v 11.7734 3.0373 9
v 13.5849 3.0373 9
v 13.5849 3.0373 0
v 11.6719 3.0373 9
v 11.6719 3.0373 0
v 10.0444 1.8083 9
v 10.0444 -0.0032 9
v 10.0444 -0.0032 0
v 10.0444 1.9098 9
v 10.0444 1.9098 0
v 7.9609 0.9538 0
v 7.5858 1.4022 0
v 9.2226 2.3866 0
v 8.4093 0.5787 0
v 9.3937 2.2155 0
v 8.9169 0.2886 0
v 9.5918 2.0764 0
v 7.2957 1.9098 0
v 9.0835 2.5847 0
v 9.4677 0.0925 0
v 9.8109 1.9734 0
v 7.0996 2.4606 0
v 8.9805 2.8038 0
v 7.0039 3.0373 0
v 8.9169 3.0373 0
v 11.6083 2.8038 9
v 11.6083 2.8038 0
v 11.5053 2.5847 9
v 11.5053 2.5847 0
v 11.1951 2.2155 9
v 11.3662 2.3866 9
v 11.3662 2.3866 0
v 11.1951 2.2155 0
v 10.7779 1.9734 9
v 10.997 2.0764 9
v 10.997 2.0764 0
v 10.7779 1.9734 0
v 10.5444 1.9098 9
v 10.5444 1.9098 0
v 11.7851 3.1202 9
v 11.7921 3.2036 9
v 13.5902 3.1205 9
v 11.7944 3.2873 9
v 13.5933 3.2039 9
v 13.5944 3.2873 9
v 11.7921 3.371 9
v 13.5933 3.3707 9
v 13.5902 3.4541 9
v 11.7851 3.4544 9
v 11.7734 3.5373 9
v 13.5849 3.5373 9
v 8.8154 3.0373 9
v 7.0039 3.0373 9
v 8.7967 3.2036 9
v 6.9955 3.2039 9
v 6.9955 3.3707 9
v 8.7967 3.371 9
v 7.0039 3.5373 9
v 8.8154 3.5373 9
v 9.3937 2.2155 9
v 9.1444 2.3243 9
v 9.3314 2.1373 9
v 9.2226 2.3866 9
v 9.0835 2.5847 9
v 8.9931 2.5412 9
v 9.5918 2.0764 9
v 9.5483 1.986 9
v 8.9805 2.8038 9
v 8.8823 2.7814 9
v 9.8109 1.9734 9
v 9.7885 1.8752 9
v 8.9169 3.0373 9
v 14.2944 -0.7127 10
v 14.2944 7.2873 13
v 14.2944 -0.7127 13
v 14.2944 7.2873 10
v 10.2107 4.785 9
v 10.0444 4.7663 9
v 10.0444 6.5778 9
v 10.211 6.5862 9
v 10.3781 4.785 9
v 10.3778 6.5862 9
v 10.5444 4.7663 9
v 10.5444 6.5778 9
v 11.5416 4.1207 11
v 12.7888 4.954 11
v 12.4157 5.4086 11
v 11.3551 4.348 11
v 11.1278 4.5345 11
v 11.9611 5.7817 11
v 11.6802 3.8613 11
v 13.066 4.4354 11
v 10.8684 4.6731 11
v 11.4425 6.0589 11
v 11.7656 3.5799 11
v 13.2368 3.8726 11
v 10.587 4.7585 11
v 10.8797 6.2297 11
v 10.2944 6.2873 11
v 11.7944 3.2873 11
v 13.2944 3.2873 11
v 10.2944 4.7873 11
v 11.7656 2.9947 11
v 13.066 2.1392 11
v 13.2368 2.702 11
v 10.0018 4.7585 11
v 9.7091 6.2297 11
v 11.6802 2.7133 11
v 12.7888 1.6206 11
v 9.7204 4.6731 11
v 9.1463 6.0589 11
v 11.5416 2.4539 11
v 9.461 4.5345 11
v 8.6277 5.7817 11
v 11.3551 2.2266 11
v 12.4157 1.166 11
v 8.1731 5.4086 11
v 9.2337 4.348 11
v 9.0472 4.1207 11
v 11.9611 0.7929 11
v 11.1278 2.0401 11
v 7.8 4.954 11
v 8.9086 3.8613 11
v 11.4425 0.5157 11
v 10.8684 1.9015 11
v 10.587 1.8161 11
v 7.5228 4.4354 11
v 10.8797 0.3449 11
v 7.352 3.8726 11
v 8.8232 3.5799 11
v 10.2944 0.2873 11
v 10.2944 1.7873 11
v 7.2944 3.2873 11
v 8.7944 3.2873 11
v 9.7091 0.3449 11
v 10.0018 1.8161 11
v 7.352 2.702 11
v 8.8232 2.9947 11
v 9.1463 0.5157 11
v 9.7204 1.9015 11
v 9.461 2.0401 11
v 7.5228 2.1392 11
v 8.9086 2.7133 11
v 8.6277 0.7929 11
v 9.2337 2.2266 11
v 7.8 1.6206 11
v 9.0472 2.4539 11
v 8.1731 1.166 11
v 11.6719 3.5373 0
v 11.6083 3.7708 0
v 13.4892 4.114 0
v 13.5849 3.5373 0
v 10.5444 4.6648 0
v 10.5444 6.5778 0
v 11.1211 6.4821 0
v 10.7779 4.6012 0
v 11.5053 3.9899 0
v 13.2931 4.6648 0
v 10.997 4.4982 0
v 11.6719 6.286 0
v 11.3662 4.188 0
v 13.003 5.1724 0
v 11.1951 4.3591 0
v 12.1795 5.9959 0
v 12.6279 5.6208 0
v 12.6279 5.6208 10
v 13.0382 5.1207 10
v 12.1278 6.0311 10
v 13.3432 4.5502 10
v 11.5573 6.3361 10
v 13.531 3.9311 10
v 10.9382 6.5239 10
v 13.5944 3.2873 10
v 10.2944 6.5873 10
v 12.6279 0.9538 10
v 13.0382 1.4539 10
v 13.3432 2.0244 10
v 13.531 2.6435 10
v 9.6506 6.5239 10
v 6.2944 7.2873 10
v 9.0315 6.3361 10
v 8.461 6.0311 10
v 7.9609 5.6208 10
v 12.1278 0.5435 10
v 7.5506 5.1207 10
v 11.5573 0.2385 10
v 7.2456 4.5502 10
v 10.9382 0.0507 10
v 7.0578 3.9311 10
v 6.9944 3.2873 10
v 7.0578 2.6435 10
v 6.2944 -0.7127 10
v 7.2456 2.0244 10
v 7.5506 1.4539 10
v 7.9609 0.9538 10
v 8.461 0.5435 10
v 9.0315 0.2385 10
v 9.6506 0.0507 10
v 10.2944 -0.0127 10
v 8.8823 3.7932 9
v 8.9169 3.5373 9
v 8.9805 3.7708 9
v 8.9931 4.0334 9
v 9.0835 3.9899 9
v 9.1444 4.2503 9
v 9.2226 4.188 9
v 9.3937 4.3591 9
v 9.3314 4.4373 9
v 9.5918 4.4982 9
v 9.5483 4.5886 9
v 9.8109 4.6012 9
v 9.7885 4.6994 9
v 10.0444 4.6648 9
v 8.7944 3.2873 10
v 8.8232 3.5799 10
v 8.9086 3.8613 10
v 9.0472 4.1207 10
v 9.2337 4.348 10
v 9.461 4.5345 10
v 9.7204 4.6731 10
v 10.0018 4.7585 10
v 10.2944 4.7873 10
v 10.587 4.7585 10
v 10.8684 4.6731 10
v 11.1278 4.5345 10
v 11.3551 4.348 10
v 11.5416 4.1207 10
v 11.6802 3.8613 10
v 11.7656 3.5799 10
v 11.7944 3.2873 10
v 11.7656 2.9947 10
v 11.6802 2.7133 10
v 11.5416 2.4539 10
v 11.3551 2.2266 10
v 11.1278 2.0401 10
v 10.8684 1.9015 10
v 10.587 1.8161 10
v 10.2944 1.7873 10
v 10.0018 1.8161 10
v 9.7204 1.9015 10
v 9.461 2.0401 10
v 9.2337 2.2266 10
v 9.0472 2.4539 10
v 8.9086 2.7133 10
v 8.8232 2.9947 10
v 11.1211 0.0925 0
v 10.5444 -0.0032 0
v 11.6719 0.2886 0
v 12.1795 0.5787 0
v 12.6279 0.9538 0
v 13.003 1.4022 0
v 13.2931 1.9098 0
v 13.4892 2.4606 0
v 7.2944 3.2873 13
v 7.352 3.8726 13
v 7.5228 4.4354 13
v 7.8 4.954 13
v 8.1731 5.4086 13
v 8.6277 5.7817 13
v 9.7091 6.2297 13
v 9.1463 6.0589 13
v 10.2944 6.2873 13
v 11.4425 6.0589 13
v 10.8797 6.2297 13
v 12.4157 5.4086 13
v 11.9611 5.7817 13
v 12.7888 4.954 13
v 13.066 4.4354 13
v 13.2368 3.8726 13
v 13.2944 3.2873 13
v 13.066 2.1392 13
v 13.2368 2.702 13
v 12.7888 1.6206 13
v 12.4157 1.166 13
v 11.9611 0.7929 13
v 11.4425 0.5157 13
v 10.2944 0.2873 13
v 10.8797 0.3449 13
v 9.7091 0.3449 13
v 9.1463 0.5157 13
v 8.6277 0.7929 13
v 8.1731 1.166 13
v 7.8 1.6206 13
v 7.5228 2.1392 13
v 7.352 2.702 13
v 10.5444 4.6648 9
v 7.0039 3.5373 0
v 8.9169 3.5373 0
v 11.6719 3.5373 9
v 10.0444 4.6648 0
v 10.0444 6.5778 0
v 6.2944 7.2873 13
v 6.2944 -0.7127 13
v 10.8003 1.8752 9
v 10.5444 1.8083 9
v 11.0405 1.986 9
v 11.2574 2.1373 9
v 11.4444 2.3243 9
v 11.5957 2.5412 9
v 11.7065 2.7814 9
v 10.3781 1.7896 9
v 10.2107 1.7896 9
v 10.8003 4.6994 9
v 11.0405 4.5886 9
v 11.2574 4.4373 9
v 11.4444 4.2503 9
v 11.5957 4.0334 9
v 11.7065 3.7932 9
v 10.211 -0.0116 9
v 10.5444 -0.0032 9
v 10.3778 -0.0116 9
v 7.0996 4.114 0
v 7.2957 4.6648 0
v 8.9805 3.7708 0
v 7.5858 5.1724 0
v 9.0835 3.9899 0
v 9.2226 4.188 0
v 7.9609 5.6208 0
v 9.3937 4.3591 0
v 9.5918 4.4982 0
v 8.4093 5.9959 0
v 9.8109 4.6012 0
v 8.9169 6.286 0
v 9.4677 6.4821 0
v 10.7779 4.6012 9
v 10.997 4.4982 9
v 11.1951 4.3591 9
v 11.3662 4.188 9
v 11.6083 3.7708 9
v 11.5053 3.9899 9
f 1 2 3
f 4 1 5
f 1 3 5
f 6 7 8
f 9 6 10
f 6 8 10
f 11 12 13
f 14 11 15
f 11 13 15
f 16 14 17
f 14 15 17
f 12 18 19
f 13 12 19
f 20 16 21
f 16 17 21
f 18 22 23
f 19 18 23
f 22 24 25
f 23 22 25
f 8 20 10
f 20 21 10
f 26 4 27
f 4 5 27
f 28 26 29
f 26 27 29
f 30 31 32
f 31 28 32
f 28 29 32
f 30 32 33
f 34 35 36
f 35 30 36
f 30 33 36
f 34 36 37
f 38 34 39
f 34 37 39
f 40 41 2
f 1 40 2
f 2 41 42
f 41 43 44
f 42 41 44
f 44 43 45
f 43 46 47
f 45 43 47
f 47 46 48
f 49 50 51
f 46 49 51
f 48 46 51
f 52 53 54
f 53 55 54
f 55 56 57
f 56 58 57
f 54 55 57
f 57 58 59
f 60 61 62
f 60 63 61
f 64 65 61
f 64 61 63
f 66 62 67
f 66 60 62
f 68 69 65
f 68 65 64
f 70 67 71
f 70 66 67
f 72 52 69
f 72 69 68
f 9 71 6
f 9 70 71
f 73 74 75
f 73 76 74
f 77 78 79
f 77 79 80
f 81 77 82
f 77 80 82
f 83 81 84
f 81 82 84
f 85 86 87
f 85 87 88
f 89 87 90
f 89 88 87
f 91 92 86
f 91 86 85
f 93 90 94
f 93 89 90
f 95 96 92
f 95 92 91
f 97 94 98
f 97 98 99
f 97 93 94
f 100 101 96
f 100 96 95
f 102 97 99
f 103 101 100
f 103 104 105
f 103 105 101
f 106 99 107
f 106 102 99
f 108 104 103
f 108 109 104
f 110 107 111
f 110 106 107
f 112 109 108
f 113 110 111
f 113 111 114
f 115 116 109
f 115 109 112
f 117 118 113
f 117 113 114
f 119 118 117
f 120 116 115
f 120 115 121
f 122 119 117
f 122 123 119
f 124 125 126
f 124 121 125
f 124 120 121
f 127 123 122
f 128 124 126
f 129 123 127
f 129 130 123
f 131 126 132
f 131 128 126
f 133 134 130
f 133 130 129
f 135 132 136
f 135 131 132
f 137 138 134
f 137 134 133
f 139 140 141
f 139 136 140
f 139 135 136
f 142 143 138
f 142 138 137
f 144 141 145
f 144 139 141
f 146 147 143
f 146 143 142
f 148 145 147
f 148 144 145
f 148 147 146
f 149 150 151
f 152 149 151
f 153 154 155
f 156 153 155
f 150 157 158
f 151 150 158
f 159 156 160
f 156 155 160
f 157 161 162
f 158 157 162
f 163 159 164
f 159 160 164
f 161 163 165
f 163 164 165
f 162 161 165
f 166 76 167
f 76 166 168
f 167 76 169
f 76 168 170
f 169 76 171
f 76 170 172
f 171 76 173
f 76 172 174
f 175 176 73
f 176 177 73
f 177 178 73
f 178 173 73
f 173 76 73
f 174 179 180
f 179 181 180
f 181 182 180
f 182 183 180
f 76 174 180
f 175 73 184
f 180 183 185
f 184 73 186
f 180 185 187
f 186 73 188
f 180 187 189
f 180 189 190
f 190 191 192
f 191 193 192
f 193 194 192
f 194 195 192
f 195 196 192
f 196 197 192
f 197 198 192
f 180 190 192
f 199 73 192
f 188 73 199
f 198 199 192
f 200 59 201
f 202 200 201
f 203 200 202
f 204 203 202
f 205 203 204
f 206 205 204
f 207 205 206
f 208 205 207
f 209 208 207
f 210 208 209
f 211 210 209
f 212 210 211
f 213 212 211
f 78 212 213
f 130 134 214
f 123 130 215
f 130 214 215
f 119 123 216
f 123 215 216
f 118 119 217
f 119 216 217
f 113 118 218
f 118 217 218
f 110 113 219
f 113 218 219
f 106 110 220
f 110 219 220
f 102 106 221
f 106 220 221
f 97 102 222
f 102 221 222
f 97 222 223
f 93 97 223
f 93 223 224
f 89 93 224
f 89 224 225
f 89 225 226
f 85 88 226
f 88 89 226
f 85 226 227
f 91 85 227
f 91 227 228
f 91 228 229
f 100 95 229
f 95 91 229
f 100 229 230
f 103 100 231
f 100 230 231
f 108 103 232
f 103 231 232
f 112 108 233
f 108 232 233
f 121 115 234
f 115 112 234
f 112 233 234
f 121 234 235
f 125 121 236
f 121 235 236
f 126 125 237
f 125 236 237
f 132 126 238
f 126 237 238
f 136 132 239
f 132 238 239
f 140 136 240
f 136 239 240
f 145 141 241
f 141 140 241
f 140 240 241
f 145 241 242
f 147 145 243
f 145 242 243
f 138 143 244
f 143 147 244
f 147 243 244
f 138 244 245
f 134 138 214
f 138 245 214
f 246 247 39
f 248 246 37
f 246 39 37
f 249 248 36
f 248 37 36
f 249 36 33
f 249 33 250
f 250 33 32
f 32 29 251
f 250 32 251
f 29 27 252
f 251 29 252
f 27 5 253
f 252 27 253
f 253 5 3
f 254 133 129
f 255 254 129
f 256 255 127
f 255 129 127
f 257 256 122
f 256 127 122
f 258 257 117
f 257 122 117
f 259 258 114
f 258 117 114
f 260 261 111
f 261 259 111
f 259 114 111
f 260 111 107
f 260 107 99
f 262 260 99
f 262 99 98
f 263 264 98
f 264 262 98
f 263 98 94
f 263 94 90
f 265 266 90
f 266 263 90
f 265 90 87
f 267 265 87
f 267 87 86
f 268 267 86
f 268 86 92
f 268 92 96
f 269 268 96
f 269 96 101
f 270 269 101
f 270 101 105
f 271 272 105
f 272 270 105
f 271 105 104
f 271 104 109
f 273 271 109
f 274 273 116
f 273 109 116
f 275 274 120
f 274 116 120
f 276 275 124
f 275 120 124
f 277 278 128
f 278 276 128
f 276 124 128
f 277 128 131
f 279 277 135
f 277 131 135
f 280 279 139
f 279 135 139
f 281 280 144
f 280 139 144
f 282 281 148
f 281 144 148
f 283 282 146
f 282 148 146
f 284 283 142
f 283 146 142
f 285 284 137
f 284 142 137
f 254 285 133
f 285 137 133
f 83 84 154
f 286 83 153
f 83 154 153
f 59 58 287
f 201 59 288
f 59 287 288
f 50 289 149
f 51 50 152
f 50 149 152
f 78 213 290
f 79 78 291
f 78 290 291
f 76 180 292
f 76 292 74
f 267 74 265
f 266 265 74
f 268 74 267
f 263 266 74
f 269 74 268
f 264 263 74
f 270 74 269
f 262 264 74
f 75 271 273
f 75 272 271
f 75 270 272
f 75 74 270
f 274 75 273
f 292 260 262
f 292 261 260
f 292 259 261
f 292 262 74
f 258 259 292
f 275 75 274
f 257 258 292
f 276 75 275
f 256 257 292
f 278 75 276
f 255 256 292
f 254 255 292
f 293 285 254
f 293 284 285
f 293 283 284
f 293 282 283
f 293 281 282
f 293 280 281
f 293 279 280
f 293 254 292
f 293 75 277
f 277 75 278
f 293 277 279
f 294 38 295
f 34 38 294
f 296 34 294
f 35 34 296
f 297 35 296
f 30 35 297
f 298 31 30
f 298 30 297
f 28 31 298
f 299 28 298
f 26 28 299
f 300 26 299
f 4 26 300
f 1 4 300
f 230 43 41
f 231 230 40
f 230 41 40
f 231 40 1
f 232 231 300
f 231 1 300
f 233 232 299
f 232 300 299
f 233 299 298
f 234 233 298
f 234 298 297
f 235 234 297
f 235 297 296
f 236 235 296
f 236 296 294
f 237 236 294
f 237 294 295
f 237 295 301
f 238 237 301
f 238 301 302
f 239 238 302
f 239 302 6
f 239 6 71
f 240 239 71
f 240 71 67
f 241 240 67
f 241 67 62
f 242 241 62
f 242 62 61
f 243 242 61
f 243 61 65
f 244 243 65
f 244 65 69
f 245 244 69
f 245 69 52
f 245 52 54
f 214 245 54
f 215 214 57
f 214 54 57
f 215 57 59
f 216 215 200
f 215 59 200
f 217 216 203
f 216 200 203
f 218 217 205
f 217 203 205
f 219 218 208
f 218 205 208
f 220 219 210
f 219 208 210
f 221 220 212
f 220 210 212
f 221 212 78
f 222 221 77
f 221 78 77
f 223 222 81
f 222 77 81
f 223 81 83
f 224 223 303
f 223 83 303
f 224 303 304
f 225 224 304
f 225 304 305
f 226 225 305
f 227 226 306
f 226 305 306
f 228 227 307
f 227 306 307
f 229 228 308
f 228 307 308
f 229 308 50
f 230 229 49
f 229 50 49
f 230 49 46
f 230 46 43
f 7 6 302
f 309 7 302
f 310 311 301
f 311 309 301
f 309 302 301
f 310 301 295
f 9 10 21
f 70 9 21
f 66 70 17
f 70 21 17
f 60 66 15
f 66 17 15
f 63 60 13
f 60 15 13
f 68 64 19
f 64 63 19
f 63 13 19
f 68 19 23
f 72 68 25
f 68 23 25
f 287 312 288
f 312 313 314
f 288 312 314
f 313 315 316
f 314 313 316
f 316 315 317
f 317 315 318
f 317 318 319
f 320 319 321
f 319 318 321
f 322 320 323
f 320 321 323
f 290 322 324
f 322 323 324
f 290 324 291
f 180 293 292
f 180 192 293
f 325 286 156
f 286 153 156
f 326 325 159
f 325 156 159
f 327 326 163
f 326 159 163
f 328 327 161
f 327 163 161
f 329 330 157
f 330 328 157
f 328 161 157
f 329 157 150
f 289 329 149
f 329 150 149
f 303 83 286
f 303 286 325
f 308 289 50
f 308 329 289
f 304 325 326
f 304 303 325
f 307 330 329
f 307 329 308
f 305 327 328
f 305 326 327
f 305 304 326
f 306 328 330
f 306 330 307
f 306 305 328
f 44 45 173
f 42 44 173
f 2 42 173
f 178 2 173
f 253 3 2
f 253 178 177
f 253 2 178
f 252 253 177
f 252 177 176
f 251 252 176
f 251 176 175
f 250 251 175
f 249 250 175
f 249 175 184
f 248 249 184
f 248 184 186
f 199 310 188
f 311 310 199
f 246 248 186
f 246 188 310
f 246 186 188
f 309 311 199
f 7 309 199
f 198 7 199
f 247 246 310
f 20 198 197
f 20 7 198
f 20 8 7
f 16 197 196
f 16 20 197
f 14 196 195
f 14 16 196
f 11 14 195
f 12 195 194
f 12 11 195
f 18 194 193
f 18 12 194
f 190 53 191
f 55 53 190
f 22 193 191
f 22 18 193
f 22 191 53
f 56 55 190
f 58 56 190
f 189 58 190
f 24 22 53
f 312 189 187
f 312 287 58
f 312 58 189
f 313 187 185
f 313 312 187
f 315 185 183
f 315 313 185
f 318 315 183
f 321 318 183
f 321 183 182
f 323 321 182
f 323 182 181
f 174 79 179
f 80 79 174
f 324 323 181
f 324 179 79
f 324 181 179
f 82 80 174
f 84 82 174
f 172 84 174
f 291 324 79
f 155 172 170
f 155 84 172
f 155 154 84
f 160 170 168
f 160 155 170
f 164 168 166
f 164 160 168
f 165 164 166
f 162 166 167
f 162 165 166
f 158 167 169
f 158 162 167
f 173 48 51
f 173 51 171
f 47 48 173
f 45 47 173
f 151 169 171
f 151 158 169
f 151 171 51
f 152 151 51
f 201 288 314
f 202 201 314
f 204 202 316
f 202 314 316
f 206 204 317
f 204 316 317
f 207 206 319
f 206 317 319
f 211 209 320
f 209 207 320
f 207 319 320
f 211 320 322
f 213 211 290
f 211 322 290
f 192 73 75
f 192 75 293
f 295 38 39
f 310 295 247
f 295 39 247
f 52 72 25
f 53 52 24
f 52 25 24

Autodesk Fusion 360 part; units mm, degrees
sketch "Schizzo1" plane through (0, 0, 0) normal (0, 0, 1) x (1, 0, 0)
  circle A0 centre (10.2944, 3.2873) radius 1.4
  circle A1 centre (10.2944, 3.2873) radius 3.3
  line L0 (13.5944, 3.0373) -> (6.9944, 3.0373)
  line L1 (6.9944, 3.0373) -> (6.9944, 3.5373)
  line L2 (6.9944, 3.5373) -> (13.5944, 3.5373)
  line L3 (13.5944, 3.5373) -> (13.5944, 3.0373)
  line L4 (13.5944, 3.0373) -> (6.9944, 3.5373) construction
  line L5 (6.9944, 3.0373) -> (13.5944, 3.5373) construction
  line L6 (10.5444, -0.0127) -> (10.0444, -0.0127)
  line L7 (10.0444, -0.0127) -> (10.0444, 6.5873)
  line L8 (10.0444, 6.5873) -> (10.5444, 6.5873)
  line L9 (10.5444, 6.5873) -> (10.5444, -0.0127)
  line L10 (10.5444, -0.0127) -> (10.0444, 6.5873) construction
  line L11 (10.0444, -0.0127) -> (10.5444, 6.5873) construction
  circle A2 centre (10.2944, 3.2873) radius 1.5
  point P0 (10.2944, 3.2873)
  point P1 (10.2944, 3.2873)
  dimension "d1" = 2.8
  dimension "d2" = 6.6
  dimension "d3" = 0.5
  dimension "d4" = 0.5
  dimension "d16" = 3
extrude "Estrusione1" add sketch "Schizzo1" along normal blind 9 contours A0 L2 L9 A2 | A0 L0 L9 A2 | A1 L2 L9 A2 | A1 L0 L9 A2 | A0 L2 L7 A2 | A0 L0 L7 A2 | A1 L2 L7 A2 | A1 L0 L7 A2 makes body 1 at (7.1541, 4.3014, 6) makes body 2 at (7.5637, 1.4344, 6) makes body 3 at (12.397, 5.8308, 6) makes body 4 at (13.3249, 1.9811, 6)
extrude "Estrusione2" add sketch "Schizzo1" along normal blind 1 from surface at 9 contours A1 L2 L9 A2 | A1 L0 L2 A2 | A1 L0 L9 A2 | A1 L7 L9 A2 | A1 L7 L9 A2 | A1 L2 L7 A2 | A1 L0 L7 A2 | A1 L0 L2 A2 bodies 1 2 3 4
sketch "Schizzo2" plane through (0, 0, 10) normal (0, 0, 1) x (-1, 0, 0)
  circle A0 centre (-10.2944, -3.2873) radius 3.3
  line L0 (-14.2944, 0.7127) -> (-6.2944, 0.7127)
  line L1 (-6.2944, 0.7127) -> (-6.2944, -7.2873)
  line L2 (-6.2944, -7.2873) -> (-14.2944, -7.2873)
  line L3 (-14.2944, -7.2873) -> (-14.2944, 0.7127)
  line L4 (-14.2944, 0.7127) -> (-6.2944, -7.2873) construction
  line L5 (-6.2944, 0.7127) -> (-14.2944, -7.2873) construction
  circle A1 centre (-10.2944, -3.2873) radius 3
  circle A2 centre (-10.2944, -3.2873) radius 1.5
  point P0 (-10.2944, -3.2873)
  dimension "d10" = 8
  dimension "d11" = 8
  dimension "d13" = 6
extrude "Estrusione3" add sketch "Schizzo2" along normal blind 3 contours A0 | L0 L1 L2 L3 bodies 1
extrude "Estrusione4" add sketch "Schizzo2" along normal blind 1 contours A1 bodies 1
